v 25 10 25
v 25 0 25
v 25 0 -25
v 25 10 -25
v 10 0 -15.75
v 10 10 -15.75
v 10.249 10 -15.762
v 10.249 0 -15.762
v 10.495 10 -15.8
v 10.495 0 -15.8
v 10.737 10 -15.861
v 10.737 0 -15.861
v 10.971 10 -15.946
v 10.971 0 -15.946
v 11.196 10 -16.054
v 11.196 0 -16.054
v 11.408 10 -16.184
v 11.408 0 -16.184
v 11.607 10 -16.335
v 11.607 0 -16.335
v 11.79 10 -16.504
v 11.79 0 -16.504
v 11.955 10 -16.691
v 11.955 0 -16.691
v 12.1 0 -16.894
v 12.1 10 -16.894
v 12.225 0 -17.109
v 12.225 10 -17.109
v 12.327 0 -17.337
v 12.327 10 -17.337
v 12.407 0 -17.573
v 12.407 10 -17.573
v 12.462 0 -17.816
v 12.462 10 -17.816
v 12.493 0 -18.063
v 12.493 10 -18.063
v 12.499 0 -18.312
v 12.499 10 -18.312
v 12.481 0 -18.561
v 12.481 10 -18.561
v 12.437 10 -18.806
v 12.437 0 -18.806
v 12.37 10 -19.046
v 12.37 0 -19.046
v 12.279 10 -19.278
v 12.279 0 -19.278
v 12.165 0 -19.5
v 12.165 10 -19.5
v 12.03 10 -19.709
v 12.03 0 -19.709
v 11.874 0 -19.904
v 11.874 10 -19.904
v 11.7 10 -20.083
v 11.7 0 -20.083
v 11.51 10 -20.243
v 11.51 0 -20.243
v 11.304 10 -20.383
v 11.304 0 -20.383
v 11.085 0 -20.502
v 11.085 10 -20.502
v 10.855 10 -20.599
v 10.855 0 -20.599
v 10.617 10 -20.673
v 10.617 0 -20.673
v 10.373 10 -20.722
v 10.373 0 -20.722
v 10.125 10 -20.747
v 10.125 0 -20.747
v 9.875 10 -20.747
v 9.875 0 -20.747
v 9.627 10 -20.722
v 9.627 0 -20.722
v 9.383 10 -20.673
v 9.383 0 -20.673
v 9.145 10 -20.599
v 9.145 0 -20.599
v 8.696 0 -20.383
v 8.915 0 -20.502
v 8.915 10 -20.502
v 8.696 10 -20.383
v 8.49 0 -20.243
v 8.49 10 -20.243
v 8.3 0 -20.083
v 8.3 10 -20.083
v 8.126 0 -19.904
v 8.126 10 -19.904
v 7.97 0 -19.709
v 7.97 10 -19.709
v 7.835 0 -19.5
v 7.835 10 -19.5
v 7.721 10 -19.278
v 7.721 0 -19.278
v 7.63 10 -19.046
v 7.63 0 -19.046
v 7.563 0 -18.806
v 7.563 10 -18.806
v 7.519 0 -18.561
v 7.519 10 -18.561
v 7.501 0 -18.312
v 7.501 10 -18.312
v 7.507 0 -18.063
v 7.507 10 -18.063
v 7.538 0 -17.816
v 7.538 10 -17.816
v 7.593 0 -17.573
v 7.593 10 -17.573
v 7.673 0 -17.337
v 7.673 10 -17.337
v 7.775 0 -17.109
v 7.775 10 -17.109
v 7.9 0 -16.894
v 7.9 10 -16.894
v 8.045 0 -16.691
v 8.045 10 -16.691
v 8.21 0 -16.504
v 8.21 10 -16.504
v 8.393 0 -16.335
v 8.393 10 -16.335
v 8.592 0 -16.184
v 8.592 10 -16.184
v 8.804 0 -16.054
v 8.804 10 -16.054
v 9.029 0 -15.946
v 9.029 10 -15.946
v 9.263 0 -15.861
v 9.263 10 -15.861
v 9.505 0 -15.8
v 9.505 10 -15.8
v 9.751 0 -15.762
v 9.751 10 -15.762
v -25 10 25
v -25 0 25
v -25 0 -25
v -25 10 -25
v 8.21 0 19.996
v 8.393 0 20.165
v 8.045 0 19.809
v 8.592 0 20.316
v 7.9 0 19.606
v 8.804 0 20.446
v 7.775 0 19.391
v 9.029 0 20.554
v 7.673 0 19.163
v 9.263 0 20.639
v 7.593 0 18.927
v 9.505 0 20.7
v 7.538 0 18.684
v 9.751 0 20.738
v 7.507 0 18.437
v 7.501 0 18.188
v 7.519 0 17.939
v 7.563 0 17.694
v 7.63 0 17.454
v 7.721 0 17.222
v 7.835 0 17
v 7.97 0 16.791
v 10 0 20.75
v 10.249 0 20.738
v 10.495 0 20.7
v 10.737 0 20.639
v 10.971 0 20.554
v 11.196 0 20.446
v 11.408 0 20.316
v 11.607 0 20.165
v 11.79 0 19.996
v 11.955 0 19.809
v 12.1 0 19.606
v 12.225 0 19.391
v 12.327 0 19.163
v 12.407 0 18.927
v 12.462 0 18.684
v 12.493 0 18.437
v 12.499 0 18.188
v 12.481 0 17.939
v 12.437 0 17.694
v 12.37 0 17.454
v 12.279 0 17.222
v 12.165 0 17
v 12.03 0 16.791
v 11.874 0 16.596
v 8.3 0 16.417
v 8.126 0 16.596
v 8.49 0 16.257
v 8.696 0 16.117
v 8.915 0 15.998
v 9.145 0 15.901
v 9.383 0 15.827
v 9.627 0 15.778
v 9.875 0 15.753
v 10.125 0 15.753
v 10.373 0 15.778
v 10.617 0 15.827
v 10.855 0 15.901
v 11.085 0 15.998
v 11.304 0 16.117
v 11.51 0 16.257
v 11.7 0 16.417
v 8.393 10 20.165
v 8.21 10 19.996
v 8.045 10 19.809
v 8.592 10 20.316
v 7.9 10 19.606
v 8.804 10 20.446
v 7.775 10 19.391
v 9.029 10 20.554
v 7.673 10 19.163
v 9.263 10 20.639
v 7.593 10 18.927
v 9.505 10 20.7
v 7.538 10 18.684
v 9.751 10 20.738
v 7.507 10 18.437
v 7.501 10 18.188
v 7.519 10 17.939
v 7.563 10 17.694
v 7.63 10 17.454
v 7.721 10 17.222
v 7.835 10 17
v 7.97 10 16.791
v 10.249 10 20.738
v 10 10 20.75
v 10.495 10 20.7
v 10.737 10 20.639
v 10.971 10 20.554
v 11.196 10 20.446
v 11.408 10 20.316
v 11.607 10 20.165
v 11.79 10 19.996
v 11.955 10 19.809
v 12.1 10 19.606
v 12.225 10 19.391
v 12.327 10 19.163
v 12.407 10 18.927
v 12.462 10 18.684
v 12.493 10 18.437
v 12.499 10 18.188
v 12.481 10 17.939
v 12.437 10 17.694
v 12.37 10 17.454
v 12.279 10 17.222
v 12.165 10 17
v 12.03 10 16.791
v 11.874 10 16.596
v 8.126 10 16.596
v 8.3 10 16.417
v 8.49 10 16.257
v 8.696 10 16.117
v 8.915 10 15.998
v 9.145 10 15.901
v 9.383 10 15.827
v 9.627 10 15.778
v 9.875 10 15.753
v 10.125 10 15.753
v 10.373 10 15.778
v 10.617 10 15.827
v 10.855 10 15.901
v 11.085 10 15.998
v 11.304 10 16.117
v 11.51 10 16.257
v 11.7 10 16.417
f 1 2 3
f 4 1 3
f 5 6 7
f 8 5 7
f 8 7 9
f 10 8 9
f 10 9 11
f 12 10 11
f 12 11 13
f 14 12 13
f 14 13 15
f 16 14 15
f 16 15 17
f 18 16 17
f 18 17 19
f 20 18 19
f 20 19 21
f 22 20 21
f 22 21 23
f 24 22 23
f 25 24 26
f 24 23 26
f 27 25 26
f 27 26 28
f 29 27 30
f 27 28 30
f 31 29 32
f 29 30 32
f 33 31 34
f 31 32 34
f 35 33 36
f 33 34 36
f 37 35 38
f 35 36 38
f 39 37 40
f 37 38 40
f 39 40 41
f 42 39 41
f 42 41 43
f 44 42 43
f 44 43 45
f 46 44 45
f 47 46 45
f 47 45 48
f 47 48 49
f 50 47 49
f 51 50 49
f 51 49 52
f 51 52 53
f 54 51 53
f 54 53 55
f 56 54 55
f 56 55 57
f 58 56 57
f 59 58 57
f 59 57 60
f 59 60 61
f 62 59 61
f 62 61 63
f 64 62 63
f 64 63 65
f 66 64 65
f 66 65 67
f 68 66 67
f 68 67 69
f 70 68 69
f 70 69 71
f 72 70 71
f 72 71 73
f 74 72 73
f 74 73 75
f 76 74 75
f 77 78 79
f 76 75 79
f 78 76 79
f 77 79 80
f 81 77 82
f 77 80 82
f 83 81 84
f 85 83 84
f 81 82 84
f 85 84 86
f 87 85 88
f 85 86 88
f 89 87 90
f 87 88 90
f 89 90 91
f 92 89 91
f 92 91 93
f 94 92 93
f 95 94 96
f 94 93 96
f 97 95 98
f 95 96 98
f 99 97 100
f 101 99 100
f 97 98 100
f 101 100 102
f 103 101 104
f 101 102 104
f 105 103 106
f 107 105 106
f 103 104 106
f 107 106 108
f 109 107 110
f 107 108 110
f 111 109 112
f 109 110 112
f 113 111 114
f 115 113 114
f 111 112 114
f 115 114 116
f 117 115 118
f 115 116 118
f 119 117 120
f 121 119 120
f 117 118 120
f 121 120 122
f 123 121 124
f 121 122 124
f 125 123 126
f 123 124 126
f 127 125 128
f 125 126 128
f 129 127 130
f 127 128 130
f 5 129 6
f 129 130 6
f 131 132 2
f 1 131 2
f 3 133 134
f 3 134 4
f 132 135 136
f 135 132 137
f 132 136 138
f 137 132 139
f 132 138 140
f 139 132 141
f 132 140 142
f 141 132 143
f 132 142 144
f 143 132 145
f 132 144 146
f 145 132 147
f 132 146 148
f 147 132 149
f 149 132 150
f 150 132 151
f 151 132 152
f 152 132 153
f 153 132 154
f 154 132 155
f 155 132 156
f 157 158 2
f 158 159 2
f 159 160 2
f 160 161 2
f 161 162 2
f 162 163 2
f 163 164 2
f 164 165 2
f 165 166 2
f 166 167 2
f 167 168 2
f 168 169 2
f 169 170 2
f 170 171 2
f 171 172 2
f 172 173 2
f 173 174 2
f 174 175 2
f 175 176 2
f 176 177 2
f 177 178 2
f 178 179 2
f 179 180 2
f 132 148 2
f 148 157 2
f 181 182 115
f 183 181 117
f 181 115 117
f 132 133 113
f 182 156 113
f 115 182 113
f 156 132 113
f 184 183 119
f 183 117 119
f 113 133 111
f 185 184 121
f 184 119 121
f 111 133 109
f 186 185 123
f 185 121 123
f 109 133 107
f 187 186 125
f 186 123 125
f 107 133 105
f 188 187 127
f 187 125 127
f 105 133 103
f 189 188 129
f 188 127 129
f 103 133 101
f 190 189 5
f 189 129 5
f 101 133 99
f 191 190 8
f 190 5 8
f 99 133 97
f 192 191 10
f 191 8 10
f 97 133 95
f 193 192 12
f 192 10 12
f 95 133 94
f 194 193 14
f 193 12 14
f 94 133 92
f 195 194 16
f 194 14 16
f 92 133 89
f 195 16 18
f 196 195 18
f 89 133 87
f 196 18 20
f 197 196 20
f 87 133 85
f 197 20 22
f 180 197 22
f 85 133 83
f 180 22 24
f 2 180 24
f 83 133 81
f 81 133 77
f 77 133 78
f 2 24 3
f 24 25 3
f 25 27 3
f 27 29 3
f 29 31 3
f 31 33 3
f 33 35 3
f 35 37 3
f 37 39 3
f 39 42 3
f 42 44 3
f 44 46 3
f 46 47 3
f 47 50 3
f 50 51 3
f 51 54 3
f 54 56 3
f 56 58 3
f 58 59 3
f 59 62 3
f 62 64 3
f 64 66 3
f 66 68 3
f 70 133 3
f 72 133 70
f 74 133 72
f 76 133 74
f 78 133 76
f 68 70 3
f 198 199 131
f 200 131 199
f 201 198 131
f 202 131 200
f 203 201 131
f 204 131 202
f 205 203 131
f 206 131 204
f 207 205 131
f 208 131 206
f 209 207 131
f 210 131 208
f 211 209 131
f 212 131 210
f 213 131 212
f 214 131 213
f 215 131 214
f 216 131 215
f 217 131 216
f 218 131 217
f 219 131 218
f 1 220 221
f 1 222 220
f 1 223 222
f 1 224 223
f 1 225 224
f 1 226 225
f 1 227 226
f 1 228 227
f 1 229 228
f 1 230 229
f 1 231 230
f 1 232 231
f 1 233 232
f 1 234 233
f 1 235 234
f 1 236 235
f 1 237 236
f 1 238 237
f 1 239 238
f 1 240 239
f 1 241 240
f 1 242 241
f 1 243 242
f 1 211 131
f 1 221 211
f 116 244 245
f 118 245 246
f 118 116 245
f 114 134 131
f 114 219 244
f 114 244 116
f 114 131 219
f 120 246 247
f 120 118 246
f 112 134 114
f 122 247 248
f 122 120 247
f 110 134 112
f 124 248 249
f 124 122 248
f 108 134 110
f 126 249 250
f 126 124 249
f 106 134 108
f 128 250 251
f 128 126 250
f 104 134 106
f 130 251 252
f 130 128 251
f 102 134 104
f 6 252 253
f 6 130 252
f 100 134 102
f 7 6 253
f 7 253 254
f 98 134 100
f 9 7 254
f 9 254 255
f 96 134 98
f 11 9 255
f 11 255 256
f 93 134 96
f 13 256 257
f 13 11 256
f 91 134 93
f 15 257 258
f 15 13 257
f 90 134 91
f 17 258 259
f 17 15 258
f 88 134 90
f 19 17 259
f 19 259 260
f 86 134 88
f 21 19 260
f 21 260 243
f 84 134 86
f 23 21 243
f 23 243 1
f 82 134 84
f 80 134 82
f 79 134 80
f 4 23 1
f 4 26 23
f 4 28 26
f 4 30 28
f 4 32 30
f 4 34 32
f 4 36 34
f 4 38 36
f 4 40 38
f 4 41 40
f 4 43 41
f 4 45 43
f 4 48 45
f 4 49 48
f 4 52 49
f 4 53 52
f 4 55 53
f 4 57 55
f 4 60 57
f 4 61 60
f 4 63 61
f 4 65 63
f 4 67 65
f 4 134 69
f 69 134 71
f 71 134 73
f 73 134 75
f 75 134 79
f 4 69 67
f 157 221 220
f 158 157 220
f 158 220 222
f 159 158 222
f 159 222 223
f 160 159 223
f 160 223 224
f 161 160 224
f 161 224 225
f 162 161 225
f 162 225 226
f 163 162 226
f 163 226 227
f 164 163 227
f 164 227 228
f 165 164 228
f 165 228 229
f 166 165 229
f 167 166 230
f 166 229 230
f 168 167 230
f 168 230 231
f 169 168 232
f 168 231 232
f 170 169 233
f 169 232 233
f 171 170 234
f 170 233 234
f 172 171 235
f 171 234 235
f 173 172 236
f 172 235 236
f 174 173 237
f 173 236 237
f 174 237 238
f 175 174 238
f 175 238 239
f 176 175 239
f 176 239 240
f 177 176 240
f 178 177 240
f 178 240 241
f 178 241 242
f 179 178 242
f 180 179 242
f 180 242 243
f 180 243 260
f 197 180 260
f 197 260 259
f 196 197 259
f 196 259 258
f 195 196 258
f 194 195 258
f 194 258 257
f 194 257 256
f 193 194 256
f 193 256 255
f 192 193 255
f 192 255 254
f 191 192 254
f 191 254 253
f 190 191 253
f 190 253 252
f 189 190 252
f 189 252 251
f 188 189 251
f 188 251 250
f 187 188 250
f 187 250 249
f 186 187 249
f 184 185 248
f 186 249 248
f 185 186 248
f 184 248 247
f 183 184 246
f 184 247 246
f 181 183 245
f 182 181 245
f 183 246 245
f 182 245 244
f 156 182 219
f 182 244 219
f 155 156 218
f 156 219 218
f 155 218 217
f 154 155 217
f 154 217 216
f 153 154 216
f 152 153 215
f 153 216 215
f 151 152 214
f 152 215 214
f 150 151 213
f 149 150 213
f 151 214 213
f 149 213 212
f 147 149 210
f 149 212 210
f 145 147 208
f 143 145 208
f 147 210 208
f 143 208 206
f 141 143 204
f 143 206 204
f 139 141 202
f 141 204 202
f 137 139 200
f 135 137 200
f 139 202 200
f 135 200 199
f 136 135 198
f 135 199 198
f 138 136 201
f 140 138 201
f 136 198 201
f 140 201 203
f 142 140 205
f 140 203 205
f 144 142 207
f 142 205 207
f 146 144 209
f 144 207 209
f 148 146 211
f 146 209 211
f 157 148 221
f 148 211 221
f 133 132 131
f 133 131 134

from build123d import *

# Parameters (mm, degrees)
ESBO_O2_W                = 50
ESBO_O2_H                = 50
RESSALTO_EXTRUS_O2_DEPTH = 10
ESBO_O5_R                = 2.5
CORTE_EXTRUS_O5_DEPTH    = 37.742346142


with BuildPart() as part:
    # Esboço2 → Ressalto-extrusão2 (new body)
    with BuildSketch(Plane(origin=(0, 0, 0), x_dir=(1, 0, 0), z_dir=(0, 1, 0))):
        Rectangle(ESBO_O2_W, ESBO_O2_H)
    extrude(amount=RESSALTO_EXTRUS_O2_DEPTH)

    # Esboço5 → Corte-extrusão5 (cut, through all)
    with BuildSketch(Plane(origin=(0, 10, 0), x_dir=(1, 0, 0), z_dir=(0, 1, 0))):
        with Locations(Location((10, 18.25, 0), (0, 0, 270))):
            Circle(ESBO_O5_R)
        with Locations(Location((10, -18.25, 0), (0, 0, 270))):
            Circle(ESBO_O5_R)
    extrude(amount=-CORTE_EXTRUS_O5_DEPTH, mode=Mode.SUBTRACT)


solid = part.part
